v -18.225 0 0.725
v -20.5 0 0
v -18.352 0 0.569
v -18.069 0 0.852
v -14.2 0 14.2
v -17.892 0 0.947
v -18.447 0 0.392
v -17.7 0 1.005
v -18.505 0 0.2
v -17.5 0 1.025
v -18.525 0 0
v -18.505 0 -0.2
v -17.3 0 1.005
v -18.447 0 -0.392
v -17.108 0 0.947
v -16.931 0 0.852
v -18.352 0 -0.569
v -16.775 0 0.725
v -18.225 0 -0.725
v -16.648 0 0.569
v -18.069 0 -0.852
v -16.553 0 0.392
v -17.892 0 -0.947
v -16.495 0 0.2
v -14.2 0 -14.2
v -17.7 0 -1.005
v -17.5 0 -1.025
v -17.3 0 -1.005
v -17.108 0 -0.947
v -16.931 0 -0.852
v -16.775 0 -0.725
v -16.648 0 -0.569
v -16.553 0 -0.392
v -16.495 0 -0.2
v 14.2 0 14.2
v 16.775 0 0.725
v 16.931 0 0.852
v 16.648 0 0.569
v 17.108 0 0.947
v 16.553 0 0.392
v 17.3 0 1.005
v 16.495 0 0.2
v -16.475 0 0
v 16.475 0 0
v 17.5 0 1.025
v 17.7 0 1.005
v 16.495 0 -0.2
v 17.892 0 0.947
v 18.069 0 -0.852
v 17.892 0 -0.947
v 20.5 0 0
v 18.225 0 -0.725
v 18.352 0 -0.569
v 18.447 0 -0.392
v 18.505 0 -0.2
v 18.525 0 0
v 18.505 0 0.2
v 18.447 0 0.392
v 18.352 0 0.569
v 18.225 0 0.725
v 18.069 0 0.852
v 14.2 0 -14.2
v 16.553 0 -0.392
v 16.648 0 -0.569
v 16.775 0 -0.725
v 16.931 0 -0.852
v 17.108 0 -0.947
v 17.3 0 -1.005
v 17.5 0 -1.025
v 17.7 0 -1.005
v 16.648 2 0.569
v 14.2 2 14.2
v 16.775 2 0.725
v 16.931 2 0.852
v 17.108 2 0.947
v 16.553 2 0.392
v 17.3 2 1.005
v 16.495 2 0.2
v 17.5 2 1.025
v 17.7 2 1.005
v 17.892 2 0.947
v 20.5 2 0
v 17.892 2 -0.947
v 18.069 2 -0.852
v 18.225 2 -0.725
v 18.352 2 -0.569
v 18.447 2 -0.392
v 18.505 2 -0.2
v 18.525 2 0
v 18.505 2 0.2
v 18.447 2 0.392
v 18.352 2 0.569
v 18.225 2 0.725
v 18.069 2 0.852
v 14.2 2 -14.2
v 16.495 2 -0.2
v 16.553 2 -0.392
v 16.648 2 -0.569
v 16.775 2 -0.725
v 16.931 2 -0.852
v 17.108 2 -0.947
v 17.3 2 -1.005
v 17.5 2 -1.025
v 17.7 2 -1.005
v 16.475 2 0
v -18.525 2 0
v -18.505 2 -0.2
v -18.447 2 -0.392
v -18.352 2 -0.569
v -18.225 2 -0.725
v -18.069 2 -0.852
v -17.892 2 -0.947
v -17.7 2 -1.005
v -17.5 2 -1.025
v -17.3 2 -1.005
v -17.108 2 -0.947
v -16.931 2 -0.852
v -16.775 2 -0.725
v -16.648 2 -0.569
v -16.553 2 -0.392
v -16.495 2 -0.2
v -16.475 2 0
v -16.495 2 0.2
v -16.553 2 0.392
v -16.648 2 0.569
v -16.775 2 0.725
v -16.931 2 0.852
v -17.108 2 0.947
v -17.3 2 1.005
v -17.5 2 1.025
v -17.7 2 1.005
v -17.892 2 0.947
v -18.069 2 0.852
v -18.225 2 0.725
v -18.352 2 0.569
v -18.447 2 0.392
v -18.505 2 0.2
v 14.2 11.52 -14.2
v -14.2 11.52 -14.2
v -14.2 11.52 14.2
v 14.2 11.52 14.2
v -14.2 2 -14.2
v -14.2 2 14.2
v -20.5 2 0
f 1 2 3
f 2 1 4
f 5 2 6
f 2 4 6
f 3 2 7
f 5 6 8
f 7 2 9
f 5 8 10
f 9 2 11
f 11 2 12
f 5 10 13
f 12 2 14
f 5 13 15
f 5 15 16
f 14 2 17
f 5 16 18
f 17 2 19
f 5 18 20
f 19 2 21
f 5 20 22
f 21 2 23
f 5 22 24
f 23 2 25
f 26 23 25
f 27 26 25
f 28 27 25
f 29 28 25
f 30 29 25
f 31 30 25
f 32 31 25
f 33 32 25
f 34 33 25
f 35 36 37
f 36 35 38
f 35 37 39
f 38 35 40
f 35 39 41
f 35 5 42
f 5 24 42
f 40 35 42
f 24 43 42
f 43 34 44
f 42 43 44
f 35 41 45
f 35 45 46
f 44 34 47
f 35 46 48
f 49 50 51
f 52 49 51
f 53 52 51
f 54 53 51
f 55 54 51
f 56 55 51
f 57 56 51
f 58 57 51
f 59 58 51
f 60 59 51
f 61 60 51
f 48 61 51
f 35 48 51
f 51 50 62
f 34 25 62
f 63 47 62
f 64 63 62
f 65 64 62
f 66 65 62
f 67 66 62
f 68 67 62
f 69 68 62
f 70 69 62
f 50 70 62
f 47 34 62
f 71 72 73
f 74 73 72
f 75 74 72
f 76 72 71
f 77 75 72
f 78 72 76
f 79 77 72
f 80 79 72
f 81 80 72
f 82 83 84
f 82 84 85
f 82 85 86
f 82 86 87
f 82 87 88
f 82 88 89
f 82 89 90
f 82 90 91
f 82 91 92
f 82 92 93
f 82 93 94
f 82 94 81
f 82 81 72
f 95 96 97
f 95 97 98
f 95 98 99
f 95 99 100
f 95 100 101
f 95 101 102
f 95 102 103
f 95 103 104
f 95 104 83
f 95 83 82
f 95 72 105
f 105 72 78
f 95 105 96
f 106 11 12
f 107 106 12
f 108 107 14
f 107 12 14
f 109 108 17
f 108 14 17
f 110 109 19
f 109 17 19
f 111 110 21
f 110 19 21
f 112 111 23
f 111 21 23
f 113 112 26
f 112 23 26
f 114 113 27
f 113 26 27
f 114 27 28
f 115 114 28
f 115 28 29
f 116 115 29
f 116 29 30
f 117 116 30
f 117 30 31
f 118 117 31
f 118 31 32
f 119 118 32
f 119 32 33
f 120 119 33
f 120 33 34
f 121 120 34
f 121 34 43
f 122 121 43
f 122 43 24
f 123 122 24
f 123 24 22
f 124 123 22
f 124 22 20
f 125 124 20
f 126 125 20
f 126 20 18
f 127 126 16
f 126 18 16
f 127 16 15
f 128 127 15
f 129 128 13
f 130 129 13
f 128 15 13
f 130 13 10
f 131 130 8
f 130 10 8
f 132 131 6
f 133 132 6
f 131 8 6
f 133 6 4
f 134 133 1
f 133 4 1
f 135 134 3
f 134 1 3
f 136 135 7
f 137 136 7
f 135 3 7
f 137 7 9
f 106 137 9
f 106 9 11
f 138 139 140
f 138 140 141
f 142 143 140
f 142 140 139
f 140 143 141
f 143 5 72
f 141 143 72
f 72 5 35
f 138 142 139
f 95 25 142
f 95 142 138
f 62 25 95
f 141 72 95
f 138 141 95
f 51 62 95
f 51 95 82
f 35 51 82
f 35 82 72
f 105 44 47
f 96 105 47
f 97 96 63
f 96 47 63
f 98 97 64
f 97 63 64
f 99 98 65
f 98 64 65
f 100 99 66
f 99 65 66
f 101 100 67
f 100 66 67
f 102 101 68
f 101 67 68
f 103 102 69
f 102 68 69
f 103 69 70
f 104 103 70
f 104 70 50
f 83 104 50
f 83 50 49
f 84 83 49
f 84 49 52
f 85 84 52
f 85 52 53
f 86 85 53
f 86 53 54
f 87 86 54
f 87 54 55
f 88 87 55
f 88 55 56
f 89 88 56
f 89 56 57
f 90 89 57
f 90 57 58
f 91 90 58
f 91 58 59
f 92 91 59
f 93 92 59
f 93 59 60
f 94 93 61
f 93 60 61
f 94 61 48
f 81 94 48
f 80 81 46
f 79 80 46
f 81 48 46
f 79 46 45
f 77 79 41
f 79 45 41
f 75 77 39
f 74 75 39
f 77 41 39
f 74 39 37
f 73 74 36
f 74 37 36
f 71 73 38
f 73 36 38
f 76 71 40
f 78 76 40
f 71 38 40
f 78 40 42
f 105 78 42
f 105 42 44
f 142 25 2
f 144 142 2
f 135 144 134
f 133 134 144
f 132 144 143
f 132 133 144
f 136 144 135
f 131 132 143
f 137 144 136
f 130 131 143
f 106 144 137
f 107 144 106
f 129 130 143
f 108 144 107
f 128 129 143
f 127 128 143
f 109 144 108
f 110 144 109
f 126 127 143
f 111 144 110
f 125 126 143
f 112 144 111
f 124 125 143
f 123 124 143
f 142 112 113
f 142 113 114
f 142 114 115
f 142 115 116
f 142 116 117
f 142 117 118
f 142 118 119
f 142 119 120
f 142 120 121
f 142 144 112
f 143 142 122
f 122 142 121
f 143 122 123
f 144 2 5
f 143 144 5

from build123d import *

# Parameters (mm, degrees)
BOSS_EXTRUDE1_DEPTH     = 2
SKETCH1_3_W             = 28.4
SKETCH1_3_H             = 28.4
BOSS_EXTRUDE2_DEPTH     = 11.52
M2_5_TAPPED_HOLE1_D     = 2.05
M2_5_TAPPED_HOLE1_DEPTH = 6.35
M2_5_TAPPED_HOLE1_TIP   = 0.615882135


with BuildPart() as part:
    # Sketch1 → Boss-Extrude1 (new body)
    with BuildSketch(Plane(origin=(0, 0, 0), x_dir=(1, 0, 0), z_dir=(0, 1, 0))):
        Polygon((-14.2, -14.2), (14.2, -14.2), (20.5, 0), (14.2, 14.2), (-14.2, 14.2), (-20.5, 0), align=None)
    extrude(amount=BOSS_EXTRUDE1_DEPTH)

    # Sketch1<3> → Boss-Extrude2 (add)
    with BuildSketch(Plane(origin=(0, 0, 0), x_dir=(1, 0, 0), z_dir=(0, 1, 0))):
        Rectangle(SKETCH1_3_W, SKETCH1_3_H)
    extrude(amount=BOSS_EXTRUDE2_DEPTH)

    # M2.5 Tapped Hole1
    with Locations(Plane(origin=(0, 2, 0), x_dir=(1, 0, 0), z_dir=(0, 1, 0))):
        with Locations((-17.5, 0), (17.5, 0)):
            Hole(M2_5_TAPPED_HOLE1_D / 2, depth=M2_5_TAPPED_HOLE1_DEPTH)
            with Locations((0, 0, -(M2_5_TAPPED_HOLE1_DEPTH + M2_5_TAPPED_HOLE1_TIP / 2))):  # 118° drill point
                Cone(0, M2_5_TAPPED_HOLE1_D / 2, M2_5_TAPPED_HOLE1_TIP, mode=Mode.SUBTRACT)


solid = part.part
